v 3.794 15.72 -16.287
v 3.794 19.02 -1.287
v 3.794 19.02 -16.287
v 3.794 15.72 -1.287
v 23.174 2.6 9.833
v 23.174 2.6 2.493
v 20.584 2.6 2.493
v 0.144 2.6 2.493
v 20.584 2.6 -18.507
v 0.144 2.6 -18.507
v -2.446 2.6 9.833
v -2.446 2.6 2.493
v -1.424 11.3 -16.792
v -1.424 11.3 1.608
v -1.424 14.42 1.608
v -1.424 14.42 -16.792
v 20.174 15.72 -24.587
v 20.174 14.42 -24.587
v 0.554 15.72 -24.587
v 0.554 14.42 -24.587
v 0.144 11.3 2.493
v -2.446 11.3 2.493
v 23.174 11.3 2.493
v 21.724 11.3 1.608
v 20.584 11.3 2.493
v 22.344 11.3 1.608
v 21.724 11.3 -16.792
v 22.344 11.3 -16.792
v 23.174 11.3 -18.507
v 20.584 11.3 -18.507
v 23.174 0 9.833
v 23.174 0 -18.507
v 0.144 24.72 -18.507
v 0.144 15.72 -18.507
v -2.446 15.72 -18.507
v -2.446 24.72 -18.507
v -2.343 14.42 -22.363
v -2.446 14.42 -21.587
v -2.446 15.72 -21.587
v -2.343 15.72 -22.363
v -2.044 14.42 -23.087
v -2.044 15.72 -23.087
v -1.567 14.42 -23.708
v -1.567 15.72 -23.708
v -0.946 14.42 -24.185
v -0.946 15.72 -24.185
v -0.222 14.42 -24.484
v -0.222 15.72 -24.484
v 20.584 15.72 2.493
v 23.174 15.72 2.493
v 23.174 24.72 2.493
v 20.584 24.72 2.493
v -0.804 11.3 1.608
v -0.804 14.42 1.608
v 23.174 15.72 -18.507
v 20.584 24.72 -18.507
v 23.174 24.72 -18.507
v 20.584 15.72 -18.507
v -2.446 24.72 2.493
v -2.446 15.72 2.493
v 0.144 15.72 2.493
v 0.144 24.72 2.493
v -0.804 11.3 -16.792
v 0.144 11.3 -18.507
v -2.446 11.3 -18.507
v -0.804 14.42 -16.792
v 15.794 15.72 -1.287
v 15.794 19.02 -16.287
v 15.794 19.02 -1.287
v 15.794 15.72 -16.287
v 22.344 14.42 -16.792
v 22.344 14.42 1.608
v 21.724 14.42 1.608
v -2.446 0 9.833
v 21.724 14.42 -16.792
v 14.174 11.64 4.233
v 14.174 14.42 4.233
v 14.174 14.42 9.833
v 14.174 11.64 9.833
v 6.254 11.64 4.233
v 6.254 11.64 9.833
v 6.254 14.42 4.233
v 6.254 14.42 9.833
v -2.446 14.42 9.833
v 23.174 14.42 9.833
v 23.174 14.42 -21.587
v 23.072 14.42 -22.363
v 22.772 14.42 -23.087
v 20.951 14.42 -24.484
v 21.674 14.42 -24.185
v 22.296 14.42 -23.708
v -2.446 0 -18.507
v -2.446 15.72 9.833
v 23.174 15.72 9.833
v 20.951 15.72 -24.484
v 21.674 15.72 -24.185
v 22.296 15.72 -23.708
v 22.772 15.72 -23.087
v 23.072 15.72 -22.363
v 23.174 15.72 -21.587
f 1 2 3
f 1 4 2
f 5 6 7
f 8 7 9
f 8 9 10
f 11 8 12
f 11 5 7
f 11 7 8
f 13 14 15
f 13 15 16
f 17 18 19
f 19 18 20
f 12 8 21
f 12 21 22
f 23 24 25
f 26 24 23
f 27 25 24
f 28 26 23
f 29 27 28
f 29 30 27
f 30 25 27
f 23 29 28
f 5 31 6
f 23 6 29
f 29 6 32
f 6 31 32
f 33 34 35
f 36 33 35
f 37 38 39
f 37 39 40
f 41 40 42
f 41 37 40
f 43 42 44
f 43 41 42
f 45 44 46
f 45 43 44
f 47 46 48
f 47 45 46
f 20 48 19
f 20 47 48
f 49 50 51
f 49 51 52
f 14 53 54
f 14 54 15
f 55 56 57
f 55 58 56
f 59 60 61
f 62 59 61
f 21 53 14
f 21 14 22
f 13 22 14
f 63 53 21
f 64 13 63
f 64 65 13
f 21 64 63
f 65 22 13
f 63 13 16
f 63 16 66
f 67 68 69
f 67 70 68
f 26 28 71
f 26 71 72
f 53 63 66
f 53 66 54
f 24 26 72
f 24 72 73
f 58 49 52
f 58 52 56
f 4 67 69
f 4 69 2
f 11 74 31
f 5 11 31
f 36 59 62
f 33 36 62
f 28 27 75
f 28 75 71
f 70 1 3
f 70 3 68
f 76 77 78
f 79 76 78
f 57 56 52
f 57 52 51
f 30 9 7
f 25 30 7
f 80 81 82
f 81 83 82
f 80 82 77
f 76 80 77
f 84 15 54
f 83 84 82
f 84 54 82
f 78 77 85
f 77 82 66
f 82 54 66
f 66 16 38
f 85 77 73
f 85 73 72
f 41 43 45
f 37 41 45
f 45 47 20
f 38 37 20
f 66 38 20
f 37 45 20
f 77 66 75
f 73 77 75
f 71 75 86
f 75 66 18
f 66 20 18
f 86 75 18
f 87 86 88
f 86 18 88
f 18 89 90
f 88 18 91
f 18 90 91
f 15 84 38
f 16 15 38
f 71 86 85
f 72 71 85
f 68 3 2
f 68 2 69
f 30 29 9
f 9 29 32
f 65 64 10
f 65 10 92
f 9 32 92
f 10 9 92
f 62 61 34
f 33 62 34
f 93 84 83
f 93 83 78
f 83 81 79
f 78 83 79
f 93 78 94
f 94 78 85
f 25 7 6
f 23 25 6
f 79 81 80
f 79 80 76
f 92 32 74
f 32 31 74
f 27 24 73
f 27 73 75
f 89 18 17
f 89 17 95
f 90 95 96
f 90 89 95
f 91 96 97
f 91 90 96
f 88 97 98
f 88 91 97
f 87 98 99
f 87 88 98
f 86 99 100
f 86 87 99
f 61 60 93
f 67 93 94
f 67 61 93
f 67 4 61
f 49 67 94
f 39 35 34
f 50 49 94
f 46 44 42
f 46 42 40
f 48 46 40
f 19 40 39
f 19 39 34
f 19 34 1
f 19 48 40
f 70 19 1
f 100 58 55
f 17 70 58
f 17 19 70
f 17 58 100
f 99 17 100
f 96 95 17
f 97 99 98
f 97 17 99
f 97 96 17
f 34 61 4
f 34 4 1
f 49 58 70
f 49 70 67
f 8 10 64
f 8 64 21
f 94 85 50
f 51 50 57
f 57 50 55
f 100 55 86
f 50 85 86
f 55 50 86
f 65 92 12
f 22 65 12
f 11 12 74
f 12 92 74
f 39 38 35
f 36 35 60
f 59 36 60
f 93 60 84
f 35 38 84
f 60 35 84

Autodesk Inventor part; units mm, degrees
ref_plane "YZ Plane" through (0, 0, 0) normal (1, 0, 0) x (0, 1, 0)
ref_plane "XZ Plane" through (0, 0, 0) normal (0, 1, 0) x (-1, 0, 0)
ref_plane "XY Plane" through (0, 0, 0) normal (0, 0, 1) x (1, 0, 0)
sketch "Sketch1" plane through (0, 0, 0) normal (0, 1, 0) x (-1, 0, 0)
  line L0 (2.4457, 9.8333) -> (-23.1743, 9.8333)
  line L1 (-23.1743, 9.8333) -> (-23.1743, -18.5067)
  line L2 (-23.1743, -18.5067) -> (2.4457, -18.5067)
  line L3 (2.4457, -18.5067) -> (2.4457, 9.8333)
  point P0 (0, 0)
  dimension "d0" = 28.34
  dimension "d1" = 25.62
extrude "Extrusion1" add sketch "Sketch1" along normal blind 2.6
sketch "Sketch2" plane through (0, 2.6, 0) normal (0, 1, 0) x (1, 0, 0)
  line L0 (23.1743, 18.5067) -> (-2.4457, 18.5067) projected
  line L1 (-2.4457, 18.5067) -> (0.1443, 18.5067)
  line L2 (0.1443, 18.5067) -> (0.1443, -2.4933)
  line L3 (0.1443, -2.4933) -> (-2.4457, -2.4933)
  line L4 (-2.4457, -2.4933) -> (-2.4457, 18.5067)
  point P0 (0, 0)
  dimension "d4" = 21
  dimension "d5" = 2.59
extrude "Extrusion2" add sketch "Sketch2" along normal blind 8.7
sketch "Sketch3" plane through (0, 2.6, 0) normal (0, 1, 0) x (1, 0, 0)
  line L0 (23.1743, 18.5067) -> (20.5843, 18.5067)
  line L1 (20.5843, 18.5067) -> (20.5843, -2.4933)
  line L2 (20.5843, -2.4933) -> (23.1743, -2.4933)
  line L3 (23.1743, -2.4933) -> (23.1743, 18.5067)
  point P0 (0, 0)
  dimension "d8" = 21
  dimension "d9" = 2.59
extrude "Extrusion3" add sketch "Sketch3" along normal blind 8.7
sketch "Sketch4" plane through (0, 11.3, 0) normal (0, 1, 0) x (1, 0, 0)
  line L0 (-1.4241, 16.7919) -> (-0.8041, 16.7919)
  line L1 (-0.8041, 16.7919) -> (-0.8041, -1.6081)
  line L2 (-0.8041, -1.6081) -> (-1.4241, -1.6081)
  line L3 (-1.4241, -1.6081) -> (-1.4241, 16.7919)
  line L4 (21.7236, 16.7919) -> (22.3436, 16.7919)
  line L5 (22.3436, 16.7919) -> (22.3436, -1.6081)
  line L6 (22.3436, -1.6081) -> (21.7236, -1.6081)
  line L7 (21.7236, -1.6081) -> (21.7236, 16.7919)
  point P0 (0, 0)
  dimension "d14" = 18.4
  dimension "d15" = 0.62
  dimension "d16" = 18.4
  dimension "d17" = 0.62
extrude "Extrusion4" add sketch "Sketch4" along normal blind 3.12
sketch "Sketch5" plane through (0, 14.42, 0) normal (0, 1, 0) x (1, 0, 0)
  line L0 (-2.4457, -9.8333) -> (23.1743, -9.8333) projected
  line L1 (23.1743, -9.8333) -> (23.1743, -2.4933) projected
  line L2 (-2.4457, -9.8333) -> (23.1743, -9.8333)
  line L3 (23.1743, -9.8333) -> (23.1743, 21.5867)
  line L4 (20.1743, 24.5867) -> (0.5543, 24.5867)
  line L5 (-2.4457, 21.5867) -> (-2.4457, -9.8333)
  arc A0 (0.5543, 24.5867) -> (-2.4457, 21.5867) centre (0.5543, 21.5867) ccw
  arc A1 (23.1743, 21.5867) -> (20.1743, 24.5867) centre (20.1743, 21.5867) ccw
  point P0 (0, 0)
  point P1 (-2.4457, 24.5867)
  dimension "d18" = 34.42
  dimension "d19" = 3
extrude "Extrusion5" add sketch "Sketch5" along normal blind 1.3
sketch "Sketch6" plane through (0, 15.72, 0) normal (0, 1, 0) x (1, 0, 0)
  line L0 (-2.4457, -2.4933) -> (0.1443, -2.4933) projected
  line L1 (0.1443, 18.5067) -> (-2.4457, 18.5067) projected
  line L2 (-2.4457, -2.4933) -> (0.1443, -2.4933)
  line L3 (0.1443, -2.4933) -> (0.1443, 18.5067)
  line L4 (0.1443, 18.5067) -> (-2.4457, 18.5067)
  line L5 (-2.4457, 18.5067) -> (-2.4457, -2.4933)
  line L6 (23.1743, -2.4933) -> (20.5843, -2.4933) projected
  line L7 (20.5843, 18.5067) -> (0.1443, 18.5067) projected
  line L8 (23.1743, -2.4933) -> (20.5843, -2.4933)
  line L9 (20.5843, -2.4933) -> (20.5843, 18.5067)
  line L10 (20.5843, 18.5067) -> (23.1743, 18.5067)
  line L11 (23.1743, 18.5067) -> (23.1743, -2.4933)
  point P0 (0, 0)
extrude "Extrusion6" add sketch "Sketch6" along normal blind 9
sketch "Sketch7" plane through (0, 15.72, 0) normal (0, 1, 0) x (1, 0, 0)
  line L0 (3.7943, 16.2867) -> (15.7943, 16.2867)
  line L1 (15.7943, 16.2867) -> (15.7943, 1.2867)
  line L2 (15.7943, 1.2867) -> (3.7943, 1.2867)
  line L3 (3.7943, 1.2867) -> (3.7943, 16.2867)
  line L4 (20.5843, 18.5067) -> (20.5843, -2.4933) projected
  line L5 (-2.4457, -9.8333) -> (23.1743, -9.8333) projected
  point P0 (0, 0)
  dimension "d24" = 15
  dimension "d25" = 12
  dimension "d28" = 4.79
  dimension "d29" = 11.12
extrude "Extrusion7" add sketch "Sketch7" along normal blind 3.3
sketch "Sketch8" plane through (0, 14.42, 0) normal (0, -1, 0) x (1, 0, 0)
  line L0 (-2.4457, 9.8333) -> (23.1743, 9.8333) projected
  line L1 (14.1743, 9.8333) -> (6.2543, 9.8333)
  line L2 (6.2543, 9.8333) -> (6.2543, 4.2333)
  line L3 (6.2543, 4.2333) -> (14.1743, 4.2333)
  line L4 (14.1743, 4.2333) -> (14.1743, 9.8333)
  line L5 (23.1743, 9.8333) -> (23.1743, -21.5867) projected
  point P0 (0, 0)
  dimension "d30" = 9
  dimension "d31" = 7.92
  dimension "d32" = 5.6
extrude "Extrusion8" add sketch "Sketch8" along normal blind 2.78
equation "\"d16\" = d14"
equation "\"d17\" = d15"
properties part number "Wemos"
